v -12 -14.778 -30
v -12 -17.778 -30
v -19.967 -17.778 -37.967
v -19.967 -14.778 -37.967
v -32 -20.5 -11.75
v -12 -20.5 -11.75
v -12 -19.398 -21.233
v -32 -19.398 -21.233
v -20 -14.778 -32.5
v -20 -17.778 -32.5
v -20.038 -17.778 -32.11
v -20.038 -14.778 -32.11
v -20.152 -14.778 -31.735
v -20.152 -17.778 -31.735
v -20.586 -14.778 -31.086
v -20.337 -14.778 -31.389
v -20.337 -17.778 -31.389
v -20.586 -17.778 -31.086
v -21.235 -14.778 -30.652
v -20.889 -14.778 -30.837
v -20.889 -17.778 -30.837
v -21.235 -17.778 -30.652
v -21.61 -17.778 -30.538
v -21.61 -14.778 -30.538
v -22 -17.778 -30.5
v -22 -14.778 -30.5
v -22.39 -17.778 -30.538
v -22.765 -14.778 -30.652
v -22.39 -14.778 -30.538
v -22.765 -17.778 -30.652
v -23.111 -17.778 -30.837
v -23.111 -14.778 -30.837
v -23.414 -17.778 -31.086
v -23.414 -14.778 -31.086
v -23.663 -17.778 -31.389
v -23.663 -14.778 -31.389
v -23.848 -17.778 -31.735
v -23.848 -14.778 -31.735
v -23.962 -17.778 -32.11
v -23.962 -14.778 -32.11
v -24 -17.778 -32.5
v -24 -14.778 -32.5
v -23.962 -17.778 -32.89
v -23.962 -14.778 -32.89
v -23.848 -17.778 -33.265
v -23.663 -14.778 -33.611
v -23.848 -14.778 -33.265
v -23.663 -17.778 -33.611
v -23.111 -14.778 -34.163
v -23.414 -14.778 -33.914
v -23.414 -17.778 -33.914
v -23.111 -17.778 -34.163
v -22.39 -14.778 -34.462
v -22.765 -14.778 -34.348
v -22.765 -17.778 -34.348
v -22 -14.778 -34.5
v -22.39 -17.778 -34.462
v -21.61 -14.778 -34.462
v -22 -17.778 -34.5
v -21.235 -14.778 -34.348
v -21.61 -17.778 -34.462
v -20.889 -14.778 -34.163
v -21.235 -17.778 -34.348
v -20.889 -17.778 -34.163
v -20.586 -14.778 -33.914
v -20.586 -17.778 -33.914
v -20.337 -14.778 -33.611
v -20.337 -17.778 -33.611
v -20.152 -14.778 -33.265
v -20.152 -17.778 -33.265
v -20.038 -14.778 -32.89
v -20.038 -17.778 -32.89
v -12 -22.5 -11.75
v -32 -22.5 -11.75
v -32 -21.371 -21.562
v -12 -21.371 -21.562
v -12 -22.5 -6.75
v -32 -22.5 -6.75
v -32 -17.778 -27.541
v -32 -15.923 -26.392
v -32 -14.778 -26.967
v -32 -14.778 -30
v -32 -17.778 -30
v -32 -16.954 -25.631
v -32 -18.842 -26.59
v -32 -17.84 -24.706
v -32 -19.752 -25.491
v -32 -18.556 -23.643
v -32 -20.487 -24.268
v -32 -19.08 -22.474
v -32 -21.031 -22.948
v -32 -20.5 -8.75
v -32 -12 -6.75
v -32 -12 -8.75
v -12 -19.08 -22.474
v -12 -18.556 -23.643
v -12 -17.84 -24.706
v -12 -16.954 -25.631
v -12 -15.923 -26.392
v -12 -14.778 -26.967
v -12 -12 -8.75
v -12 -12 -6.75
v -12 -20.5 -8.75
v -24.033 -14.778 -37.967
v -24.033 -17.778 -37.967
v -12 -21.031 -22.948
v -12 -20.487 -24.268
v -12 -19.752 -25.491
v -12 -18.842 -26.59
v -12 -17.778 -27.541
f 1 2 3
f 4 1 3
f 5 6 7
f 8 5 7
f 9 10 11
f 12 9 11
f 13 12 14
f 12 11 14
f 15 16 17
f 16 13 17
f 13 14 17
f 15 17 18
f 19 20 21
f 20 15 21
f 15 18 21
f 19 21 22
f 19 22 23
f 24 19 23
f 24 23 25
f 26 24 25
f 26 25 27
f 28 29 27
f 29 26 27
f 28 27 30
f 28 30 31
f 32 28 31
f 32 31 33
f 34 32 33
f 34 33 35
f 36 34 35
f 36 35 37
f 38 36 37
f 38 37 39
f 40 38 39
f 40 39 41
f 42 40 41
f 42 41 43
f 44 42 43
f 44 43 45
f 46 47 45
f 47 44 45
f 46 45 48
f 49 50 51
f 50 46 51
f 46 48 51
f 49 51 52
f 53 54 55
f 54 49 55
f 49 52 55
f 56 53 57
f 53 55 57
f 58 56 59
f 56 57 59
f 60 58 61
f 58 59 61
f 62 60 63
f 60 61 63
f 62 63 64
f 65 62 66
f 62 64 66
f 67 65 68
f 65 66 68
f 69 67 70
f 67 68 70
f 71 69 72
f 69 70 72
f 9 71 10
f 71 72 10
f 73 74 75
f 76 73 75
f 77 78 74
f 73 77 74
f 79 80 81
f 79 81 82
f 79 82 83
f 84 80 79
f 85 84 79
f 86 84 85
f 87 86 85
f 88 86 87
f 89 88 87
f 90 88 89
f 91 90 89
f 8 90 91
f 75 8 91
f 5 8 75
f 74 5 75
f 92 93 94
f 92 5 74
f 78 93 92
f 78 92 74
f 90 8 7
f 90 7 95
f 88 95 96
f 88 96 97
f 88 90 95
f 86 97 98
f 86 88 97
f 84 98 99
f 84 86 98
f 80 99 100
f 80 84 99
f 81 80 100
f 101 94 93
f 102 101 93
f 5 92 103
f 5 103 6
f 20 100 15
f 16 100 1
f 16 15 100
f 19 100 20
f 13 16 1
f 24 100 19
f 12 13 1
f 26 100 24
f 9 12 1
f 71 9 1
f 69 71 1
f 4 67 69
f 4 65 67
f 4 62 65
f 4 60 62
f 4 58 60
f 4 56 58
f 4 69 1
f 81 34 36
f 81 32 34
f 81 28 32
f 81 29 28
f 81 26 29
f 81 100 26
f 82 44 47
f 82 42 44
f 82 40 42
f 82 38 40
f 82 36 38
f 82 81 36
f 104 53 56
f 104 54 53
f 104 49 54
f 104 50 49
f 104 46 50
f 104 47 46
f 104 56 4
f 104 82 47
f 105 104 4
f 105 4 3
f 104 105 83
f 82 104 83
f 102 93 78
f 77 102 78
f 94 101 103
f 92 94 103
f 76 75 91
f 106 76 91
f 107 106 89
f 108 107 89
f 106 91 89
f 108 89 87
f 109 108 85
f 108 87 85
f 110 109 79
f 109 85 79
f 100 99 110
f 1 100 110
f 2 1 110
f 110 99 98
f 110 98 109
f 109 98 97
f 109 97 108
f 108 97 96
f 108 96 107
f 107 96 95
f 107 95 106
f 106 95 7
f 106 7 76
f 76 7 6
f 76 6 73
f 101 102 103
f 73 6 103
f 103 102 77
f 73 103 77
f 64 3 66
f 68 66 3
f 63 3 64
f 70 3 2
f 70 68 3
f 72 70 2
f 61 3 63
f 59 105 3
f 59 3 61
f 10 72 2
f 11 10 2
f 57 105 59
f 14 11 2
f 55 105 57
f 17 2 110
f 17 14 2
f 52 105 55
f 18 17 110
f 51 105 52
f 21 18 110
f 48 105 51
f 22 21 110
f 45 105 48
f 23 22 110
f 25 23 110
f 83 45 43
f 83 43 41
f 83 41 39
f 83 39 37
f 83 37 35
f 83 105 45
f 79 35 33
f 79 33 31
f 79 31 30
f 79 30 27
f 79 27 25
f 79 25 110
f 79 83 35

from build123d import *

# Parameters (mm, degrees)
EXTRUDE004_DEPTH  = 10
CYLINDER024_R     = 2
CYLINDER024_DEPTH = 20
EXTRUDE003_DEPTH  = 20


with BuildPart() as extrude004:
    # Sketch006 → Extrude004 (new body)
    with BuildSketch(Plane(origin=(0, 20, 0), x_dir=(-1, 0, 0), z_dir=(0, 1, 0))):
        Polygon((24, -38), (32, -30), (33, -30), (33, -39), (11, -39), (11, -30), (12, -30), (20, -38), align=None)
    extrude(amount=-EXTRUDE004_DEPTH)


with BuildPart() as extrude004_1:
    # Extrude004 placement: moved
    add(extrude004.part.moved(Location((0, -23, 0))))


with BuildPart() as fusion005:
    # Cylinder024 → Cylinder024 (new body)
    with BuildSketch(Plane(origin=(-22, 0, -32.5), x_dir=(1, 0, 0), z_dir=(0, -1, 0))):
        Circle(CYLINDER024_R)
    extrude(amount=CYLINDER024_DEPTH)

    # Fusion005: union Extrude004
    add(extrude004_1.part)


with BuildPart() as body001:
    # Sketch005 → Extrude003 (new body)
    with BuildSketch(Plane(origin=(-80, 0, 0), x_dir=(0, -1, 0), z_dir=(-1, 0, 0))):
        with BuildLine():
            Line((9.222057, -26.966565), (9.222057, -37.966565))
            Line((9.222057, -37.966565), (6.222057, -37.966565))
            Line((6.222057, -37.966565), (6.222057, -27.540914))
            ThreePointArc((2.629328, -21.56221), (3.857128, -24.893224), (6.222057, -27.540914))
            Line((1.5, -11.75), (2.629328, -21.56221))
            Line((1.5, -6.75), (1.5, -11.75))
            Line((12, -6.75), (1.5, -6.75))
            Line((12, -8.75), (12, -6.75))
            Line((12, -8.75), (3.5, -8.75))
            Line((3.5, -8.75), (3.5, -11.75))
            Line((3.5, -11.75), (4.602099, -21.233313))
            ThreePointArc((4.602099, -21.233313), (6.160095, -24.705901), (9.222057, -26.966565))
        make_face()
    extrude(amount=-EXTRUDE003_DEPTH)


with BuildPart() as body001_1:
    # Extrude003 placement: moved
    add(body001.part.moved(Location((48, 0, 0))))

    # Cut004: cut Fusion005
    add(fusion005.part, mode=Mode.SUBTRACT)


with BuildPart() as part_mirroring001:
    # Part__Mirroring001: instance of Body001
    add(body001_1.part.mirror(Plane(origin=(0, -12, 0), x_dir=(1, 0, 0), z_dir=(0, 1, 0))))


solid = part_mirroring001.part
